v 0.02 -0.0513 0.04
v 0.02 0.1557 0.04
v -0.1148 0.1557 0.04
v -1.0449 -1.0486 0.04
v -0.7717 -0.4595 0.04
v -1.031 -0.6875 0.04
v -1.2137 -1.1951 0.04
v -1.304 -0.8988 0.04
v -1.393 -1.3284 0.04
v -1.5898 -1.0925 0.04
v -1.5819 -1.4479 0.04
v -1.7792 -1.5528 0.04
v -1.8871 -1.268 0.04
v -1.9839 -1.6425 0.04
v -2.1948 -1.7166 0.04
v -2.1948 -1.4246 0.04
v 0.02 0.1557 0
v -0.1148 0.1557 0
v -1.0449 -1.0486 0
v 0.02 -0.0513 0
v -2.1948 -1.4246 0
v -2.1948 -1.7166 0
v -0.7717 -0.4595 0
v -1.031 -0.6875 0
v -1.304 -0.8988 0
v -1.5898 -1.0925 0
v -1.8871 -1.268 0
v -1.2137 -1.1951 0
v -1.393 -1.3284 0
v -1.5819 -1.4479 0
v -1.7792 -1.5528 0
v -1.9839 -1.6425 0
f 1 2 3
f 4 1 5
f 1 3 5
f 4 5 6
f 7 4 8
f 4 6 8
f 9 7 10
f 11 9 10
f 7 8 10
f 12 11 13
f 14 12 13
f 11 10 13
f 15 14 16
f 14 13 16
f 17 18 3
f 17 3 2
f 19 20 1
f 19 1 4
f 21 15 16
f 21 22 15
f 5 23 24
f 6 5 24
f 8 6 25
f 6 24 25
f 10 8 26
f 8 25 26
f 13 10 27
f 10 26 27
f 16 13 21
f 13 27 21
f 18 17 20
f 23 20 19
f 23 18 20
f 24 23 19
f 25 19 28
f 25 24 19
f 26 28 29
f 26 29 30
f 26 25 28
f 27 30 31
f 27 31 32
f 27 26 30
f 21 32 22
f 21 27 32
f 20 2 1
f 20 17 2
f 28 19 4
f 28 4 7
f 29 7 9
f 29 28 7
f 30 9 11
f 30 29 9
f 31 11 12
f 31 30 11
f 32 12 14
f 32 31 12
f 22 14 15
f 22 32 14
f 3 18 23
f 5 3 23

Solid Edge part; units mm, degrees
sketch "Sketch1" plane through (0, 0, 0) normal (0, 0, 1) x (1, 0, 0)
  line L0 (-0.1148, 0.1557) -> (0.02, 0.1557)
  line L1 (0.02, 0.1557) -> (0.02, -0.0513)
  line L2 (0.02, -0.0513) -> (-1.045, -1.0485)
  arc A0 (-1.045, -1.0485) -> (-2.1948, -1.7165) centre (-3.0708, 1.115) cw
  line L3 (-2.1948, -1.7165) -> (-2.1948, -1.4246)
  arc A1 (-2.1948, -1.4246) -> (-0.7717, -0.4595) centre (-4.5388, 3.5636) ccw
  line L4 (-0.1148, 0.1557) -> (-0.7717, -0.4595)
  dimension "D1" = 0.1557
  dimension "D2" = 0.02
  dimension "D3" = 0.03
extrude "Protrusion1" add sketch "Sketch1" along normal blind 0.04
